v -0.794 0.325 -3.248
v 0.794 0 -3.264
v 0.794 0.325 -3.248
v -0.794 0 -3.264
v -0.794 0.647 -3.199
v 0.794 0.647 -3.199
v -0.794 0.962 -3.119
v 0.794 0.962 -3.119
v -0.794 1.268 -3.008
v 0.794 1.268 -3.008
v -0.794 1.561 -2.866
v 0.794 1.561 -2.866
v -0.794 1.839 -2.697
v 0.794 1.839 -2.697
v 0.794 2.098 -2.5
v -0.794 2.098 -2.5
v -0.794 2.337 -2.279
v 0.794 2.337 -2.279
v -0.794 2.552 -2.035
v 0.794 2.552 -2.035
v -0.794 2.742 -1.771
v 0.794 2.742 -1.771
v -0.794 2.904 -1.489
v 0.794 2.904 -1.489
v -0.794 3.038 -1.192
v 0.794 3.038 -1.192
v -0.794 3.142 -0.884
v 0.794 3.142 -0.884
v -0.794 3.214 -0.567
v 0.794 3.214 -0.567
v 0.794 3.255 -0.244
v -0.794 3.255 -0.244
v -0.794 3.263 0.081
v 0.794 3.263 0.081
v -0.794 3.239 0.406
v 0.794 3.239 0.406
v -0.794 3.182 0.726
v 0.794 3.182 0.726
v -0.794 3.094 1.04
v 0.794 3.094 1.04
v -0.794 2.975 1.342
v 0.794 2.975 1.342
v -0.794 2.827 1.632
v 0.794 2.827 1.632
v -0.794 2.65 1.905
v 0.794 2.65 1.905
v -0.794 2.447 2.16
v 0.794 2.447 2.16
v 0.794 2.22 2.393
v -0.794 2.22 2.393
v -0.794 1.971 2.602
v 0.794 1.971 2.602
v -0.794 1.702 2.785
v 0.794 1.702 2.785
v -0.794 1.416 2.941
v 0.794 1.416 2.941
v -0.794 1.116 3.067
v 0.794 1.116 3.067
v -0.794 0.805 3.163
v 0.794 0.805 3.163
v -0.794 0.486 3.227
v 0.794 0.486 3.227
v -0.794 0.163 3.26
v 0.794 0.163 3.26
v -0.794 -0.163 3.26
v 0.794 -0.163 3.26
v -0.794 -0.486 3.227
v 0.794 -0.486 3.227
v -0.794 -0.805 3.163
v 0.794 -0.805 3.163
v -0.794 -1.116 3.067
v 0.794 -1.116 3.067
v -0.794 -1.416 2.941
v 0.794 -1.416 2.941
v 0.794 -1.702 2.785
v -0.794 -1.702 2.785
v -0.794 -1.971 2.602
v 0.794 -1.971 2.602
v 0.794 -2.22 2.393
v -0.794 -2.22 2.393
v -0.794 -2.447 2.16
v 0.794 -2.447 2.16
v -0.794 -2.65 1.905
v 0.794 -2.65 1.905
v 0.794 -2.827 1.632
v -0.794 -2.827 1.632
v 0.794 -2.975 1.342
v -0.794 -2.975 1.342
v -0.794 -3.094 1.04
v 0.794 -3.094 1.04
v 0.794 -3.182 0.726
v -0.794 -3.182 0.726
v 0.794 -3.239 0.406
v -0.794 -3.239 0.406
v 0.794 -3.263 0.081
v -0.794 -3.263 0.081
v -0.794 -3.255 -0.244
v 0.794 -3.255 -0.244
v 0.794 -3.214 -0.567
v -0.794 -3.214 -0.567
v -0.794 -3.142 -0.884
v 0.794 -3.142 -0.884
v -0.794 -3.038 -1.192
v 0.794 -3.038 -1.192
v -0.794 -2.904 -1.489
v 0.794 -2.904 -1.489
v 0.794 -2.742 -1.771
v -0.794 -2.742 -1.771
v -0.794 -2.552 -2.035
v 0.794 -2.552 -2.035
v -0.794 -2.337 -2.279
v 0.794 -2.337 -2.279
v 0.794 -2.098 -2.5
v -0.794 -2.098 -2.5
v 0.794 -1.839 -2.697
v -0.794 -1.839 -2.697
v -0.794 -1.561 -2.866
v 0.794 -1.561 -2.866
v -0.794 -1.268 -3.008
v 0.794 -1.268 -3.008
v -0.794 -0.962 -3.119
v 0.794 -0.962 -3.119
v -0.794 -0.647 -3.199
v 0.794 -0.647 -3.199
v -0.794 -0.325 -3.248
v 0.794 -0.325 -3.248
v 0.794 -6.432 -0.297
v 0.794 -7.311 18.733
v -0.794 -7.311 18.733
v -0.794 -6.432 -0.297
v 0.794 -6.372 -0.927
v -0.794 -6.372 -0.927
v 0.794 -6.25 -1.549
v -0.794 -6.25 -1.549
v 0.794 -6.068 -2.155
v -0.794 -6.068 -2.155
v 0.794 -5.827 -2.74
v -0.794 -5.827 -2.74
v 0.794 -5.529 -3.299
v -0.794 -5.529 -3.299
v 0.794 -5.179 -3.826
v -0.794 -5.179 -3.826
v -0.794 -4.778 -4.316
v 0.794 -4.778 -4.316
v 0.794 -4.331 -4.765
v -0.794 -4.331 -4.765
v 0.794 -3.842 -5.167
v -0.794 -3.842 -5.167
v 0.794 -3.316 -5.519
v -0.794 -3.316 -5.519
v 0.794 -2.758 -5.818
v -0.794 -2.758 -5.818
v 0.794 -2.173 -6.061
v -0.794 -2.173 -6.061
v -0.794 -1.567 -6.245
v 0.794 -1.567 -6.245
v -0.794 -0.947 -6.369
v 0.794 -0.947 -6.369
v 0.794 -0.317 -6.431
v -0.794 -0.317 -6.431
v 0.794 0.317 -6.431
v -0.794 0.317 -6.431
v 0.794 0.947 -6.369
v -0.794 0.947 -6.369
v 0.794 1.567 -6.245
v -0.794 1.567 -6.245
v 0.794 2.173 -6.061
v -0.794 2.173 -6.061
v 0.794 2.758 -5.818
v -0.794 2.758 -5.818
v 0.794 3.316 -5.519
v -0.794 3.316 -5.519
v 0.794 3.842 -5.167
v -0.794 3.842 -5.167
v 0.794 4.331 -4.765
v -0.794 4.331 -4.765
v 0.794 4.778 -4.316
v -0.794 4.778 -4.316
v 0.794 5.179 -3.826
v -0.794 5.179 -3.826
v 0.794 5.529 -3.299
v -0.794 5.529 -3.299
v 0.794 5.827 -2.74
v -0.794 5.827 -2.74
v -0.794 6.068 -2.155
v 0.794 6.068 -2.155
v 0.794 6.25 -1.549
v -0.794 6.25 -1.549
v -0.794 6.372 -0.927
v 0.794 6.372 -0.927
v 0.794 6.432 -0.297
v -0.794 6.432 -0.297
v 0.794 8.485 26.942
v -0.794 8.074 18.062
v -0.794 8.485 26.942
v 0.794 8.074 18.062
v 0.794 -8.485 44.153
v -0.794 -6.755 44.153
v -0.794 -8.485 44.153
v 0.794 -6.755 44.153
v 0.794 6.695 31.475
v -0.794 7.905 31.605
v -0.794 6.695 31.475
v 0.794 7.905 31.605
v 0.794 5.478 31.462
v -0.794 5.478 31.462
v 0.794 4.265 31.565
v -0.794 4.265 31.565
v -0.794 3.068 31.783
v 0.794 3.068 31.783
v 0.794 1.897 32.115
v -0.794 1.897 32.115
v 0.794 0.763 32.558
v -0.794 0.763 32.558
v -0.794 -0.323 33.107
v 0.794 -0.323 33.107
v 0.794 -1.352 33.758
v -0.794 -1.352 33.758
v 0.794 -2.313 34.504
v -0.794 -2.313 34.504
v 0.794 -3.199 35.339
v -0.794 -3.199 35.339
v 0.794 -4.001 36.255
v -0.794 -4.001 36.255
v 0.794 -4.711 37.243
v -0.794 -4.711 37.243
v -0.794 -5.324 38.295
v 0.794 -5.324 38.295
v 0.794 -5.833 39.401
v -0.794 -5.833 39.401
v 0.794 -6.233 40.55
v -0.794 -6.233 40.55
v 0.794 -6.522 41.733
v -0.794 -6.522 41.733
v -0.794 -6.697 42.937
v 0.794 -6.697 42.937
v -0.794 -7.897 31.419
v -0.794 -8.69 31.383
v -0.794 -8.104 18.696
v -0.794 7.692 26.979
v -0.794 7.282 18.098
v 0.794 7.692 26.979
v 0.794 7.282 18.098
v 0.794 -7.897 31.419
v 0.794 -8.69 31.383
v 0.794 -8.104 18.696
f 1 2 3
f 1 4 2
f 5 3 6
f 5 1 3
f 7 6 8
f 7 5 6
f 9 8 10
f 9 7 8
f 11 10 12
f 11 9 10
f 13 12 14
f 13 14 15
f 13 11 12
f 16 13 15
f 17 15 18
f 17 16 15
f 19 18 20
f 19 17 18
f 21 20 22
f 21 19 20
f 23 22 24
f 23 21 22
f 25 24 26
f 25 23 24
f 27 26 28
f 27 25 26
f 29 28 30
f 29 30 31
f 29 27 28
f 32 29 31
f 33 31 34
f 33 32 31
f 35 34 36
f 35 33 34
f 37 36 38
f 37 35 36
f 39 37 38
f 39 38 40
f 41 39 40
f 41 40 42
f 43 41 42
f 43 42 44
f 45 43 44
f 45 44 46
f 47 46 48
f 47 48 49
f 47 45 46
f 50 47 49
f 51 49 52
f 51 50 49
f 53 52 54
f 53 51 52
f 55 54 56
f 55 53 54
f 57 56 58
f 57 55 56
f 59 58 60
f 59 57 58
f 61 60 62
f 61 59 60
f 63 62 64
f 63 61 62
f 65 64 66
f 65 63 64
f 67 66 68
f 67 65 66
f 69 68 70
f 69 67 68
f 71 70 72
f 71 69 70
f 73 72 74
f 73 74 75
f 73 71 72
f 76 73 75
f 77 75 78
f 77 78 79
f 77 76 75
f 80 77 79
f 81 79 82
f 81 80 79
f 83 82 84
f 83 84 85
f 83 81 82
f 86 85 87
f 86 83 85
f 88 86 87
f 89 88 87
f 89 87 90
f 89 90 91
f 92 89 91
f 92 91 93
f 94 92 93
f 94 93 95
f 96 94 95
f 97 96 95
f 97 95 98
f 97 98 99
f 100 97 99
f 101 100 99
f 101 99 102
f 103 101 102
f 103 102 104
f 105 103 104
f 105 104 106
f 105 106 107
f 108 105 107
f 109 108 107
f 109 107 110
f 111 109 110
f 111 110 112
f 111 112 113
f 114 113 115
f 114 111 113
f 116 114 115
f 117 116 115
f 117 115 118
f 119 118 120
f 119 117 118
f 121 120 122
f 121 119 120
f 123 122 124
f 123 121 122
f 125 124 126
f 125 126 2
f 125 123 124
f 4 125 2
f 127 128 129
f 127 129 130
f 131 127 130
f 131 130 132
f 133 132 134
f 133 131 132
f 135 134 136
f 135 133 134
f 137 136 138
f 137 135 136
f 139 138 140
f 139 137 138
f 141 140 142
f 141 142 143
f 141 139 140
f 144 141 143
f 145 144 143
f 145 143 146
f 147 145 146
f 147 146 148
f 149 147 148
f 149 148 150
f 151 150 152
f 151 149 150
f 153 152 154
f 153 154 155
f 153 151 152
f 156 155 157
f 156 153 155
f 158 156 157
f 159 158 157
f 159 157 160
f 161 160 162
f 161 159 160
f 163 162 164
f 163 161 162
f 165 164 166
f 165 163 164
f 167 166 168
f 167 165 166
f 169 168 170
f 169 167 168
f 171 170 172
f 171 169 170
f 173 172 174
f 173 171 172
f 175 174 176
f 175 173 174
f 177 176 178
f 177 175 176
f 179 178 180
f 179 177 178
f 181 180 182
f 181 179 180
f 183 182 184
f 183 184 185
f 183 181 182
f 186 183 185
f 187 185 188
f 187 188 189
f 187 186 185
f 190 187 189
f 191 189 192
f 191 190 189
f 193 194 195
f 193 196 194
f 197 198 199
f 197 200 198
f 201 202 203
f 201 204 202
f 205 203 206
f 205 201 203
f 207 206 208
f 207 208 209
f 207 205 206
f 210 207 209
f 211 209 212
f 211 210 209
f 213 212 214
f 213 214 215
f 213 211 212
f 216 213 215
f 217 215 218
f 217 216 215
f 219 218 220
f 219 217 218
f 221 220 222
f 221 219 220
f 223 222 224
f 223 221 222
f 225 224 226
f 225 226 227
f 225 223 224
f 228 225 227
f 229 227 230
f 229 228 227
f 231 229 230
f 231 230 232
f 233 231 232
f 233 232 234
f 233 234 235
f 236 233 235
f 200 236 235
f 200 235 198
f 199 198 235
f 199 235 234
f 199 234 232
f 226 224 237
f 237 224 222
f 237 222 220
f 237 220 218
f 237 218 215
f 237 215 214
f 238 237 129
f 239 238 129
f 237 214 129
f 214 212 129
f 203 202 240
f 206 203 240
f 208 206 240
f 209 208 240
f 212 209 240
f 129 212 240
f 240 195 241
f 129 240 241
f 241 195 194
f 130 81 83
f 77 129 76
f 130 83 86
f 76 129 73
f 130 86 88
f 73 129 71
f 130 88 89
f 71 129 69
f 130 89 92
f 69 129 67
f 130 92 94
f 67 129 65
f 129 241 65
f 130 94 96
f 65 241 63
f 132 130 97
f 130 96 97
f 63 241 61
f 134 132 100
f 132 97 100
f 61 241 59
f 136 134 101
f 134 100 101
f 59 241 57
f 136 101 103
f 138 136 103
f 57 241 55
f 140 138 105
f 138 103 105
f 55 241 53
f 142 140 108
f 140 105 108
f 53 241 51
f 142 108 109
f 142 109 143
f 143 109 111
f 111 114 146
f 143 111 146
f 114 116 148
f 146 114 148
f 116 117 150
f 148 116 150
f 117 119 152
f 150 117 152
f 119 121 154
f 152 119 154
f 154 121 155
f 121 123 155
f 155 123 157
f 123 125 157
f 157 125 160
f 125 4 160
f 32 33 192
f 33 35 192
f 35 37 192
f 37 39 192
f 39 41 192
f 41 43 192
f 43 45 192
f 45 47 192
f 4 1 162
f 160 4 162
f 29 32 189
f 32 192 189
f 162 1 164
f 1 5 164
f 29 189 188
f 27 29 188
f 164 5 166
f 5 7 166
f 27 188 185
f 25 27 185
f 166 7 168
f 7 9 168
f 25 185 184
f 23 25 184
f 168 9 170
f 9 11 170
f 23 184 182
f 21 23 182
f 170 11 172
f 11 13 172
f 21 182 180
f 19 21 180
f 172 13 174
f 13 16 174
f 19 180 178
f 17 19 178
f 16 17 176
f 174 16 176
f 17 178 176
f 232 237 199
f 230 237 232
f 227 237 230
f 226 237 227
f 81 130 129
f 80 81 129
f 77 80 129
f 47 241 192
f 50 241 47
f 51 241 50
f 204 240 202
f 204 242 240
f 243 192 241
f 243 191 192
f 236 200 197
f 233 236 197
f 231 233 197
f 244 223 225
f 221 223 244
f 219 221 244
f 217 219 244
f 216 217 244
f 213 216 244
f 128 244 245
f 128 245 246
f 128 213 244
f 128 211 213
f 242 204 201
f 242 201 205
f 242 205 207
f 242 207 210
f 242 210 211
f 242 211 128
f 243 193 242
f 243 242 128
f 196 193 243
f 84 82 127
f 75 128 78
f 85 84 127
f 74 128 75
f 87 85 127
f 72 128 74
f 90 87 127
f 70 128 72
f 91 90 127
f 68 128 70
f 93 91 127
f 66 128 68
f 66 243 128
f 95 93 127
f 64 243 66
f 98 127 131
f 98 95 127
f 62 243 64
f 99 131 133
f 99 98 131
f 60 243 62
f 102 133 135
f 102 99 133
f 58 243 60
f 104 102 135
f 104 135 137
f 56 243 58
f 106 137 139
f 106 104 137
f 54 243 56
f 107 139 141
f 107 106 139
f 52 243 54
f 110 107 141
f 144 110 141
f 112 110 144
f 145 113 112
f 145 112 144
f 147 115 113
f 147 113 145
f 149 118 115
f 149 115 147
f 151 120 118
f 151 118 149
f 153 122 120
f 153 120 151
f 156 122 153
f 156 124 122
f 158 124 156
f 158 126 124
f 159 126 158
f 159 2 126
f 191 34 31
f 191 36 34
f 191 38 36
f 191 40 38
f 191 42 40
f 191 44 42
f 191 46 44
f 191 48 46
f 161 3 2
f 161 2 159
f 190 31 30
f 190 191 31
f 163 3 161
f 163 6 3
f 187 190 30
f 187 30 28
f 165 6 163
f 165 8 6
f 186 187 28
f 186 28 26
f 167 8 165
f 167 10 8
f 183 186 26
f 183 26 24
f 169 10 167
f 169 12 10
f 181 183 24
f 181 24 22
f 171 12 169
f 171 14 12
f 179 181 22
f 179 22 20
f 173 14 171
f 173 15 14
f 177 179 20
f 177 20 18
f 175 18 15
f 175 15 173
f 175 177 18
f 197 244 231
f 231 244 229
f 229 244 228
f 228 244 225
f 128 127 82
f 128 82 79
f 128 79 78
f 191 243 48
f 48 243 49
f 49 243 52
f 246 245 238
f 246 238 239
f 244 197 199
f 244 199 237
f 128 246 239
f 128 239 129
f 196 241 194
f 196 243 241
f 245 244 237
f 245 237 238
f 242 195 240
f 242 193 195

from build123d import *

# Parameters (mm, degrees)
SKETCH1_R           = 3.2639
BOSS_EXTRUDE1_DEPTH = 0.79375


with BuildPart() as part:
    # Sketch1 → Boss-Extrude1 (new, symmetric)
    with BuildSketch(Plane(origin=(0, 0, 0), x_dir=(0, 0, -1), z_dir=(1, 0, 0))):
        with BuildLine():
            Line((-44.152950291, -6.755130934), (-44.152950291, -8.484869066))
            Line((-44.152950291, -8.484869066), (-31.419145372, -7.896786517))
            Line((-31.419145372, -7.896786517), (-31.382526818, -8.689691394))
            Line((-31.382526818, -8.689691394), (-18.696048786, -8.103794532))
            Line((-18.696048786, -8.103794532), (-18.73266734, -7.310889655))
            Line((-18.73266734, -7.310889655), (0.297049709, -6.432044362))
            ThreePointArc((0.297049709, -6.432044362), (6.4389, 0), (0.297049709, 6.432044362))
            Line((0.297049709, 6.432044362), (-18.098343438, 7.281594812))
            Line((-18.098343438, 7.281594812), (-18.061724884, 8.074499689))
            Line((-18.061724884, 8.074499689), (-26.942259507, 8.484627492))
            Line((-26.942259507, 8.484627492), (-26.978878061, 7.691722615))
            Line((-26.978878061, 7.691722615), (-31.605185419, 7.905378364))
            ThreePointArc((-31.605185419, 7.905378364), (-34.50441496, -2.313203709), (-44.152950291, -6.755130934))
        make_face()
        Circle(SKETCH1_R, mode=Mode.SUBTRACT)
    extrude(amount=BOSS_EXTRUDE1_DEPTH, both=True)


solid = part.part
